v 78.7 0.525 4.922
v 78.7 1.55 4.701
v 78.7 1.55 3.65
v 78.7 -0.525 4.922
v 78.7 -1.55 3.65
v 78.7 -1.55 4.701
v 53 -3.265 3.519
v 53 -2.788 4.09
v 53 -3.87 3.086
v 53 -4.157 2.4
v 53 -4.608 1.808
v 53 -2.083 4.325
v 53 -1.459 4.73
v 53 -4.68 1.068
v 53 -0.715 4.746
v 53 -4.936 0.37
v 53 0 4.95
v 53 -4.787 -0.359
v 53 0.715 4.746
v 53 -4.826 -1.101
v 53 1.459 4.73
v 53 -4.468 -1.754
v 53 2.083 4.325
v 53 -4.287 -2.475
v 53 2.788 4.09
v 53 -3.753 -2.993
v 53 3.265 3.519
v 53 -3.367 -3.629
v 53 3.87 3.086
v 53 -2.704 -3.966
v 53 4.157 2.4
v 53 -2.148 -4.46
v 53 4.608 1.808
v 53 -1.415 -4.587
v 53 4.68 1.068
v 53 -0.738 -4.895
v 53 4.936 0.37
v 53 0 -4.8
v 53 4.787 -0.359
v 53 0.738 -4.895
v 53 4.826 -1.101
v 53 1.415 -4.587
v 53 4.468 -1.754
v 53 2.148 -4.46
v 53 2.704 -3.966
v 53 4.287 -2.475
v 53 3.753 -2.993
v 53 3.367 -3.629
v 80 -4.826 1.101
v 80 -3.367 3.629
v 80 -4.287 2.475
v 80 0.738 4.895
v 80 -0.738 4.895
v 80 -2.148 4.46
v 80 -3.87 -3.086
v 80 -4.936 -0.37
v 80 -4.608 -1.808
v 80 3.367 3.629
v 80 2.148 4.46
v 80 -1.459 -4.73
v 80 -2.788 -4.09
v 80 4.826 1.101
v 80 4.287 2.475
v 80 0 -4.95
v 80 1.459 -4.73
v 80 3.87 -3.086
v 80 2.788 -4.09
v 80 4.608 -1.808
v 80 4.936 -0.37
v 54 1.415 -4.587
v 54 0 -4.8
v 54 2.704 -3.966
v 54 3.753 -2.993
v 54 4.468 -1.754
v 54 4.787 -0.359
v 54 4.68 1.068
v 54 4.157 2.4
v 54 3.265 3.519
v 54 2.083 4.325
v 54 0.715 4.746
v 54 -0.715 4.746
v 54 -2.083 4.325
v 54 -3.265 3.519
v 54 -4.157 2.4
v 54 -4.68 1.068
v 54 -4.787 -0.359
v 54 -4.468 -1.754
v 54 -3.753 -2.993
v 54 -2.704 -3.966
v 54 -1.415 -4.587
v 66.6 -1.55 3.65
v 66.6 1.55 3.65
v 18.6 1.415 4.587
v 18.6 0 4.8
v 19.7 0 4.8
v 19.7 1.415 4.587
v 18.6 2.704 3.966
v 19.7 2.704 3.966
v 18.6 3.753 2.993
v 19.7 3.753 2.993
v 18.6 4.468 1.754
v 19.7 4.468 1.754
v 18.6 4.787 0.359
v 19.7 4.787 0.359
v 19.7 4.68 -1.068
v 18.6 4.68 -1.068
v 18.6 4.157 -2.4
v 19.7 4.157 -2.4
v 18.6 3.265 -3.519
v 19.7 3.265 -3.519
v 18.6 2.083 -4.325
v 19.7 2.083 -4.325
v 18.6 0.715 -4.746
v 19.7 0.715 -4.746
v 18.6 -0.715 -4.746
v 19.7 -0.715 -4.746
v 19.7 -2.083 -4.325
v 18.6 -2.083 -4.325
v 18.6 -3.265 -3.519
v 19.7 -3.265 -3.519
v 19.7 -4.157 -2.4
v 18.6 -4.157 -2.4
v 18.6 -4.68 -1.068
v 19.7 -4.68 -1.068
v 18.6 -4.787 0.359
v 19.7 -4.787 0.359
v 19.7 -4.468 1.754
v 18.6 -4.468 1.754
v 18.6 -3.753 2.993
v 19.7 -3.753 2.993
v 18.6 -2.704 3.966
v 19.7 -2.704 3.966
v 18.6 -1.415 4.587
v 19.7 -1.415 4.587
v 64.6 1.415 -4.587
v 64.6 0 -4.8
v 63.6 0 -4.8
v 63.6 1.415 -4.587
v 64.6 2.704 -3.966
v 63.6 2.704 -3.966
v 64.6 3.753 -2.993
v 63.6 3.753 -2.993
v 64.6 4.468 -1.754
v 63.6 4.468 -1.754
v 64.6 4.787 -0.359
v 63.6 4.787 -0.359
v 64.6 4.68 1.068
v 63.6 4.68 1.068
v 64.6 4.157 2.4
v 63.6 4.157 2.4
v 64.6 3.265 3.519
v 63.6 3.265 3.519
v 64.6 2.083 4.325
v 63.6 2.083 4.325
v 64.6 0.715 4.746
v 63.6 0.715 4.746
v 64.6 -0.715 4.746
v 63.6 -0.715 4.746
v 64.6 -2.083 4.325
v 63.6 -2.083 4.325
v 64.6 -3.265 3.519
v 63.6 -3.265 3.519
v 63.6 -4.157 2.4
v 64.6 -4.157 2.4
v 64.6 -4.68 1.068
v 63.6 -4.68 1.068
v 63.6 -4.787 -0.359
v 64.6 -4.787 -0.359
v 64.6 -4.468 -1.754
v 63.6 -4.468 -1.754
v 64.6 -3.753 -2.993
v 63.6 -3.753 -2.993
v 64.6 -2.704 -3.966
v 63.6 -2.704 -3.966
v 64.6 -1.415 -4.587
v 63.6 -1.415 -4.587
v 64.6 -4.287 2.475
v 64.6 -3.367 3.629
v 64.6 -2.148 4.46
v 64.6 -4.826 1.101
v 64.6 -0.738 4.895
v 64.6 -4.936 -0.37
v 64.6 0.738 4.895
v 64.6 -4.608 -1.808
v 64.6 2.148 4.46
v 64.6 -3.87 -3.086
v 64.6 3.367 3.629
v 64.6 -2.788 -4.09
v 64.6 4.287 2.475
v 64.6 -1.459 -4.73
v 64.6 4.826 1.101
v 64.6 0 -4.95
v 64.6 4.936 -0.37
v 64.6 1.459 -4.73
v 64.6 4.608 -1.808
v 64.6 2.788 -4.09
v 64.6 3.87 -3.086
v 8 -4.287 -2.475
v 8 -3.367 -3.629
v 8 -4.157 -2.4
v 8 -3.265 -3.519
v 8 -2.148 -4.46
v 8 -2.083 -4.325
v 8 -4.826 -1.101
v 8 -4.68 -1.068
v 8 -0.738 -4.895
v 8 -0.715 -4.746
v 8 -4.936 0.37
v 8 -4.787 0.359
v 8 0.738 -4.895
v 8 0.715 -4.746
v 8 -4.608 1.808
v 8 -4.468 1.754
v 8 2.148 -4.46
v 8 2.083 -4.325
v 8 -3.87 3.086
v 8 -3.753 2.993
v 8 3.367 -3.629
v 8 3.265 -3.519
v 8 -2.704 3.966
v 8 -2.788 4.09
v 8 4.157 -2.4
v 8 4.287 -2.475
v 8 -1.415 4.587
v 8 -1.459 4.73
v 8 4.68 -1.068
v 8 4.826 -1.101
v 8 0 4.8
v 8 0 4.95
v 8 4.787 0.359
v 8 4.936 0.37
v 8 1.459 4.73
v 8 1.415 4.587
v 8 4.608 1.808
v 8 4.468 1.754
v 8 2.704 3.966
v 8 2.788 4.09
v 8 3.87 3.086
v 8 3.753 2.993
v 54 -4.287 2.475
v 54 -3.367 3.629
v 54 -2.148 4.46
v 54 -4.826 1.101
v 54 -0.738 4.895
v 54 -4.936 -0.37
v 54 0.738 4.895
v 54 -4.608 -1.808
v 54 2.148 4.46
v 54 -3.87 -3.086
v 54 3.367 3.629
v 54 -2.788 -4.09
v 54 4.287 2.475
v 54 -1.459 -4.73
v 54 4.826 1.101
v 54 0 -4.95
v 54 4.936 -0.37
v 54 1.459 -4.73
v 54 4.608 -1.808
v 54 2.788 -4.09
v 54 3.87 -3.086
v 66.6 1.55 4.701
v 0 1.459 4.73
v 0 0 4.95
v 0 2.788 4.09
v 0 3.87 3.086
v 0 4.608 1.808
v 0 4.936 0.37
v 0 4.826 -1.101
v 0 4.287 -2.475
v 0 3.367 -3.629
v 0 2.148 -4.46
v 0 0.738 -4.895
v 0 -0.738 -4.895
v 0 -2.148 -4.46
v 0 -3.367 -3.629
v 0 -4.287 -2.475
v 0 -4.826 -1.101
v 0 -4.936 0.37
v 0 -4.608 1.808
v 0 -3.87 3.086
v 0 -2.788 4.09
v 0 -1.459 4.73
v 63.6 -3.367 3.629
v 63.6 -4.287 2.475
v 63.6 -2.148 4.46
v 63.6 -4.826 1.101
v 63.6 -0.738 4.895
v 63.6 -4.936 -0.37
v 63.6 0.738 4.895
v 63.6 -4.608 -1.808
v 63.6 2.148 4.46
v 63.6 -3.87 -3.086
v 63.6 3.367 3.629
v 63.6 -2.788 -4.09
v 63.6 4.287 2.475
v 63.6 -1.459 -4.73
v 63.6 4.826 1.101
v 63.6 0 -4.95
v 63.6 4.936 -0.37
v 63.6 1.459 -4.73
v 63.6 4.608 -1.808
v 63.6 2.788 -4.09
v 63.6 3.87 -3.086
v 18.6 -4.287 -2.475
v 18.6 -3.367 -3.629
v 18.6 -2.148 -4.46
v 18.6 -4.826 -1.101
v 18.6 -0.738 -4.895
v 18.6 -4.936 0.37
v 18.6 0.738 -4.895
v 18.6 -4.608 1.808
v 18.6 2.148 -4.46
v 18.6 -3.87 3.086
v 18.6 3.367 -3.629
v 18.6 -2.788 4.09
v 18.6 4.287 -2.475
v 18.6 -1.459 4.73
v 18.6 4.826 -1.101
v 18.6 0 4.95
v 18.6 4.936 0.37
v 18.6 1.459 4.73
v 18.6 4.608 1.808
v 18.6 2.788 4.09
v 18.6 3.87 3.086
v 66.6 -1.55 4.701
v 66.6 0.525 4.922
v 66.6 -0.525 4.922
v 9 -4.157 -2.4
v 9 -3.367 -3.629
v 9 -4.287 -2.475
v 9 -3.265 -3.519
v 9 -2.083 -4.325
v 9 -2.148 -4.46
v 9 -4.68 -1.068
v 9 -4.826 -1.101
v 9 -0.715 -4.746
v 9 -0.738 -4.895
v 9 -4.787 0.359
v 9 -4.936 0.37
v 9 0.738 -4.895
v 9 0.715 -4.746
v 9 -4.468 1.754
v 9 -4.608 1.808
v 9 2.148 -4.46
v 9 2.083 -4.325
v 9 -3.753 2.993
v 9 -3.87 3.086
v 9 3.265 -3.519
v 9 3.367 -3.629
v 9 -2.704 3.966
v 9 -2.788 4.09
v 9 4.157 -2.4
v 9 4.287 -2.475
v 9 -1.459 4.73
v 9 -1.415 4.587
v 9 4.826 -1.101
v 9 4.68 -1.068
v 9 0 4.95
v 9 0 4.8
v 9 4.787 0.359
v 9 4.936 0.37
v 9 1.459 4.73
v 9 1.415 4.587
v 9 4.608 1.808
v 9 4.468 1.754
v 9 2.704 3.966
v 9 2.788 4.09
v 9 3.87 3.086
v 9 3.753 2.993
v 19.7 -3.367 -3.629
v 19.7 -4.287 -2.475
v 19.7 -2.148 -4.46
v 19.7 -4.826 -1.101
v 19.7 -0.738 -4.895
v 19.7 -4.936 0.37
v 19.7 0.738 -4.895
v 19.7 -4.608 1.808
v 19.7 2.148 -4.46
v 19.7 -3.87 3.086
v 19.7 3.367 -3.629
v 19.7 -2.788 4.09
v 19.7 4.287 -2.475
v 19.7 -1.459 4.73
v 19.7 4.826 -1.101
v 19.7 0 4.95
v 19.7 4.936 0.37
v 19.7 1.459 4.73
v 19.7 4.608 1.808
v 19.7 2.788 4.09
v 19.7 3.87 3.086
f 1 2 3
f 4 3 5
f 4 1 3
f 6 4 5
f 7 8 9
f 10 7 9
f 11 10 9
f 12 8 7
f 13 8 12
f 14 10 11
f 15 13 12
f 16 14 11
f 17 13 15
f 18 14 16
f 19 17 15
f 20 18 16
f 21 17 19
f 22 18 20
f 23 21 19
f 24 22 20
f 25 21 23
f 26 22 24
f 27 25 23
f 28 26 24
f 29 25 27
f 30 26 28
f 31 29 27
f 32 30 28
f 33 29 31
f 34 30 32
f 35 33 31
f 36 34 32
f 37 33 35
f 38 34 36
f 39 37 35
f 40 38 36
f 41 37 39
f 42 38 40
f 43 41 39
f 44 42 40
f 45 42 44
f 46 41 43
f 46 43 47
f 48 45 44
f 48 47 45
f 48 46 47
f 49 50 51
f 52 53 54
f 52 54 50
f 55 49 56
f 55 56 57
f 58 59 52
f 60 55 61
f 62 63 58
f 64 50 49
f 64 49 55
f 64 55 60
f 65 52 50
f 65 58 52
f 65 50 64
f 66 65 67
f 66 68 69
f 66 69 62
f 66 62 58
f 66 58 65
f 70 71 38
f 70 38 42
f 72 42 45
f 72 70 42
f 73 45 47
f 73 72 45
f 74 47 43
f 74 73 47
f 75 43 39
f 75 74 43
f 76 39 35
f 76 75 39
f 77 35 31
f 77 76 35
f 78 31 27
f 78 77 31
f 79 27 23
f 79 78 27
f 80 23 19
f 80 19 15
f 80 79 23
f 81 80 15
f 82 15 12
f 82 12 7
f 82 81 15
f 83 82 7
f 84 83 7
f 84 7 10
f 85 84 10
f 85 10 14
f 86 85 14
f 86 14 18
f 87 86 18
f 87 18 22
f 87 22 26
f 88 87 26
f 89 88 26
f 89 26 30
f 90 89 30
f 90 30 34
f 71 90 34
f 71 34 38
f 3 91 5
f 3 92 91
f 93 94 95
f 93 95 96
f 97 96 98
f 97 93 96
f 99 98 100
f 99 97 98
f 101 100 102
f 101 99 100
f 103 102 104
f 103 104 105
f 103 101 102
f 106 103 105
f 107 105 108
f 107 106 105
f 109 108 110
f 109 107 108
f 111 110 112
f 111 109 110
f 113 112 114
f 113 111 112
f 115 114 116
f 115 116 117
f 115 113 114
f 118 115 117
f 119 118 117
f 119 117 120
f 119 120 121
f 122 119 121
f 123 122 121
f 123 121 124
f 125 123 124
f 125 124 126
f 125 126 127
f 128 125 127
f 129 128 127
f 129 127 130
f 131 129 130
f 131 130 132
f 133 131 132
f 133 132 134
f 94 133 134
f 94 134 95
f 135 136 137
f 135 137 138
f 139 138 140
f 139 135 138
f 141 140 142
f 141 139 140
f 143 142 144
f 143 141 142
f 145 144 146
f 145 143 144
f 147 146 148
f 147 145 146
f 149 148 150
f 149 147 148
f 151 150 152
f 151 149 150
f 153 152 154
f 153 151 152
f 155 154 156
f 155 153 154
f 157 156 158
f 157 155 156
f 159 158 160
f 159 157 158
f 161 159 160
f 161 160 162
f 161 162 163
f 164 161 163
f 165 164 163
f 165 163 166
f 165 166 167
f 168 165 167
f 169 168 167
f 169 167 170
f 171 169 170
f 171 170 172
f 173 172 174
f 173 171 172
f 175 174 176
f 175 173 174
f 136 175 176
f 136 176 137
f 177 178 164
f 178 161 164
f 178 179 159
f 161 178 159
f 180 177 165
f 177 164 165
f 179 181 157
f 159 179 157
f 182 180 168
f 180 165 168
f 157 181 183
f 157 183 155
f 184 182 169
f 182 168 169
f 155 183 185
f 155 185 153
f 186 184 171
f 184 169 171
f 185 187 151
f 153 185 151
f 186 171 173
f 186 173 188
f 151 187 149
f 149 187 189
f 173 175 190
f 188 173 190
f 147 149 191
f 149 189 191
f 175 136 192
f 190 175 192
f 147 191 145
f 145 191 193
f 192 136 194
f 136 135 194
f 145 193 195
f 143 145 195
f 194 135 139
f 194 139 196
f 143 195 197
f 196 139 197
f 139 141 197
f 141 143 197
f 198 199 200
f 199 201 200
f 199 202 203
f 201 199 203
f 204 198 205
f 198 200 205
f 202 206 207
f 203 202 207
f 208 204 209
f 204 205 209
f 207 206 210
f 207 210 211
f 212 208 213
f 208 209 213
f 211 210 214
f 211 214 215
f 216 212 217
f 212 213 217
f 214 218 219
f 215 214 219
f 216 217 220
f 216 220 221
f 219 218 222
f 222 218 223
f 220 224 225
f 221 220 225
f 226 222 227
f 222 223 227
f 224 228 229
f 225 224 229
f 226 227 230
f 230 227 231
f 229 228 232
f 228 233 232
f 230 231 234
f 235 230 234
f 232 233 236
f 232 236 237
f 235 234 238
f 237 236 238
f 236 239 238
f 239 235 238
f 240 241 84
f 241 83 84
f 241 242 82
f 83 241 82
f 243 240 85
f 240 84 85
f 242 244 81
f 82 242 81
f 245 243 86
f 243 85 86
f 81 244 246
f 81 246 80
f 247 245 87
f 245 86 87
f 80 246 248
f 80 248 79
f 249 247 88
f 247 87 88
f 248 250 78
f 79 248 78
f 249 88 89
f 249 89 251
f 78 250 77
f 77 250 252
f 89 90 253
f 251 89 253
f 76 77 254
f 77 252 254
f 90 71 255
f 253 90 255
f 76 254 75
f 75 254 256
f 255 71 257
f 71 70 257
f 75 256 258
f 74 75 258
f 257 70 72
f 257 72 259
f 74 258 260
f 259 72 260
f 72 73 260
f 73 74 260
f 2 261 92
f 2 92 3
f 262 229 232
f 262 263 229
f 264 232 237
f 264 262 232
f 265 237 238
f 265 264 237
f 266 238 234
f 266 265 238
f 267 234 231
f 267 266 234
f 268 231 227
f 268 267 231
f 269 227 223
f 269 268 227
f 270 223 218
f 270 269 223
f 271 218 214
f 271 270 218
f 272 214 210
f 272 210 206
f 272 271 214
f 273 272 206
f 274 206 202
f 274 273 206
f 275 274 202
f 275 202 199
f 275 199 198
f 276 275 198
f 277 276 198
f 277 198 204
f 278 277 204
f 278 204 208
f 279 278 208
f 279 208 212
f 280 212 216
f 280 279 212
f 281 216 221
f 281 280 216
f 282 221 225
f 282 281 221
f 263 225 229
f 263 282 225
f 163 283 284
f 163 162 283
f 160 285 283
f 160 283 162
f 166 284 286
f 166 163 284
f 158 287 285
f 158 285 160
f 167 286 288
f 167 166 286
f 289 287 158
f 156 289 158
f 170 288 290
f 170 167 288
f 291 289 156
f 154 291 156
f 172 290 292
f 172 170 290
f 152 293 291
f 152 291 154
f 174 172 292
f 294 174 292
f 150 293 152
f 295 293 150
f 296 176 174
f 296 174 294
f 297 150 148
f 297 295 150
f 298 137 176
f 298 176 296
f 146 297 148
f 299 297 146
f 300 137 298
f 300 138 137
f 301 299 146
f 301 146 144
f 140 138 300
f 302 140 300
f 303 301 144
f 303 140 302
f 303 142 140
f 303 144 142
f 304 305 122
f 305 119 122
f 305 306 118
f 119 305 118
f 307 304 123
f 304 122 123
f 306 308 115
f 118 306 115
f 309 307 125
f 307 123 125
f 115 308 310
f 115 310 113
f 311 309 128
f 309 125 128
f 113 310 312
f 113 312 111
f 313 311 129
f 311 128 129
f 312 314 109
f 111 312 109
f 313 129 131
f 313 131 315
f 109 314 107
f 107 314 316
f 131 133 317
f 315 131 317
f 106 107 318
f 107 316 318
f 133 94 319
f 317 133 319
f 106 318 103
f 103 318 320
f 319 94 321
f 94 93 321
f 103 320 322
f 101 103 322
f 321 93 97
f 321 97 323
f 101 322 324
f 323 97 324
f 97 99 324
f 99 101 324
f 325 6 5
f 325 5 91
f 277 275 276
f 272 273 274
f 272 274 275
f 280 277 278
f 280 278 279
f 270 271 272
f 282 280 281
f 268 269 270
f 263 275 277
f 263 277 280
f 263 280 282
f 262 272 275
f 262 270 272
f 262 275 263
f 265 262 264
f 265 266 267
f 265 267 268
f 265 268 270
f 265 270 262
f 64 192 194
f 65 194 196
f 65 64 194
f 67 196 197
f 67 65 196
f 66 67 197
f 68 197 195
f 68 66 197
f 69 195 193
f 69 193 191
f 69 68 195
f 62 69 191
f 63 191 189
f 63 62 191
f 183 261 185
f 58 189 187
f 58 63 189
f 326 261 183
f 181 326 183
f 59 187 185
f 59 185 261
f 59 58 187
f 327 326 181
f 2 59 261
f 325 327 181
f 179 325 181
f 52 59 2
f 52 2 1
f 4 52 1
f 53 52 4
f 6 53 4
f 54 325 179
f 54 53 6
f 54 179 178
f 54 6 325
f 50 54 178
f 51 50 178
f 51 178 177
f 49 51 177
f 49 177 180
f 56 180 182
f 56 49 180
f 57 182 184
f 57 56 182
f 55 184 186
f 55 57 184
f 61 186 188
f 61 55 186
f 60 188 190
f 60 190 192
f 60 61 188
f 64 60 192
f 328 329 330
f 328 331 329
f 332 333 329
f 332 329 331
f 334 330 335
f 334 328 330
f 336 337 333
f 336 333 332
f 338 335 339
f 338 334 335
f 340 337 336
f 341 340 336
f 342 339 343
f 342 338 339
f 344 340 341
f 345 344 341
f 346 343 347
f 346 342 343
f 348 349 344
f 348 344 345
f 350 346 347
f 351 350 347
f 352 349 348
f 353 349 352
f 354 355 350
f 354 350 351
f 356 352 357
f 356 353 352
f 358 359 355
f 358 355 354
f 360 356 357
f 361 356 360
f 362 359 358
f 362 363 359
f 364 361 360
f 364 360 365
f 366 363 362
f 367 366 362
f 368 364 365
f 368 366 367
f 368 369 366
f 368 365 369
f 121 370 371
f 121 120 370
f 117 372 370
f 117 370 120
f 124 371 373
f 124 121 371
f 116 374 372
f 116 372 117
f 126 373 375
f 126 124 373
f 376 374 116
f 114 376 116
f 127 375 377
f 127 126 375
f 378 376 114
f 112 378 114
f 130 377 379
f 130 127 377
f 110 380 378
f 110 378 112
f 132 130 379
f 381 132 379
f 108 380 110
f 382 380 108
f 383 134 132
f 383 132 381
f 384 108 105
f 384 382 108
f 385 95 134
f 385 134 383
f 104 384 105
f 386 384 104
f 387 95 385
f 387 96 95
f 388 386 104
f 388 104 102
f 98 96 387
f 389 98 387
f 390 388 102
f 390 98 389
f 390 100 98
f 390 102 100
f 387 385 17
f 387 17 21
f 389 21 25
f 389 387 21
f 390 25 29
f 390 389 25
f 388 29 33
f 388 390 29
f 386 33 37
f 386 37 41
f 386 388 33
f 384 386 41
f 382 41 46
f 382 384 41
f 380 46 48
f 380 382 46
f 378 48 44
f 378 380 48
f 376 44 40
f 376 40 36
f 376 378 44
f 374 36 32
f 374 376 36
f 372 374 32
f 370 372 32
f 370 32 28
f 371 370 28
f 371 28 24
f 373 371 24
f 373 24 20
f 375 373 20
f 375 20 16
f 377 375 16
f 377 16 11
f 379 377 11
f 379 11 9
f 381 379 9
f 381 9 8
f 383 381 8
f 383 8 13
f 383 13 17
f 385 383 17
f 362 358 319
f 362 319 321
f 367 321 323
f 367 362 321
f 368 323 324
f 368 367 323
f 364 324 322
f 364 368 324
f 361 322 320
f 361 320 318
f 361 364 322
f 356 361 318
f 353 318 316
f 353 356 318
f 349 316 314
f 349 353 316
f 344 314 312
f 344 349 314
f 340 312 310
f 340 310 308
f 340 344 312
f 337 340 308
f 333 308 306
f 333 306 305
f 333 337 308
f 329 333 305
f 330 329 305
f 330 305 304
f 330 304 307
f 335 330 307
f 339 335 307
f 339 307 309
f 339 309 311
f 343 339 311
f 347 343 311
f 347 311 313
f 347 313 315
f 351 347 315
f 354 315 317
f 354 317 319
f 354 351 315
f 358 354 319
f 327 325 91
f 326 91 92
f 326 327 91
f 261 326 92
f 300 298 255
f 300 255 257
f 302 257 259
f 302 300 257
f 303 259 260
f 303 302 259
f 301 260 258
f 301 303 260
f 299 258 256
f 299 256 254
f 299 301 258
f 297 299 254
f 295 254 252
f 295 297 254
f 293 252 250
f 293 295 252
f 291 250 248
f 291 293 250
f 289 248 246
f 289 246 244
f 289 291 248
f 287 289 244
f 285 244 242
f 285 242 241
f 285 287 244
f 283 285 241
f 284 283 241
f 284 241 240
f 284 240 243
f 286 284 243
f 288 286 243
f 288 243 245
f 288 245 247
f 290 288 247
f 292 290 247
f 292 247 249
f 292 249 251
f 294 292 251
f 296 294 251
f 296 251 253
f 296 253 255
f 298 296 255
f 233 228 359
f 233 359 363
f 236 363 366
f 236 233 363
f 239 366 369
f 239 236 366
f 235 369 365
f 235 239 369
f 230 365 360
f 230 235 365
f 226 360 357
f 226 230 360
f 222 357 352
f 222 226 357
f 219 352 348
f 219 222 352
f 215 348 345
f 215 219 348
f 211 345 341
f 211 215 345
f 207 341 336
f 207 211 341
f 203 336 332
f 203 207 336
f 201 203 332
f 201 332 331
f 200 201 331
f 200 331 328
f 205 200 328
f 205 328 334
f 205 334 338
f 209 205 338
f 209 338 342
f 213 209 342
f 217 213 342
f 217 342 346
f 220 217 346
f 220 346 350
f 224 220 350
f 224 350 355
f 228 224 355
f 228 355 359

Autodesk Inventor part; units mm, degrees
ref_plane "YZ Plane" through (0, 0, 0) normal (1, 0, 0) x (0, 1, 0)
ref_plane "XZ Plane" through (0, 0, 0) normal (0, 1, 0) x (-1, 0, 0)
sketch "스케치1" plane through (0, 0, 0) normal (1, 0, 0) x (0, 1, 0)
  circle A0 centre (0, 0) radius 6
  dimension "d0" = 12
extrude "돌출1" add sketch "스케치1" along normal blind 80
sketch "스케치8" plane through (0, 0, 0) normal (-1, 0, 0) x (0, 0, 1)
  circle A0 centre (0, 0) radius 6 projected
  circle A1 centre (0, 0) radius 4.95
  dimension "d26" = 9.9
extrude "돌출8" cut sketch "스케치8" against normal blind 18.6
sketch "스케치9" plane through (0, 0, 0) normal (-1, 0, 0) x (0, 0, 1)
  circle A0 centre (0, 0) radius 4.8
  circle A1 centre (0, 0) radius 4.95 projected
  dimension "d29" = 9.6
extrude "돌출9" cut sketch "스케치9" against normal blind 9
sketch "스케치10" plane through (0, 0, 0) normal (-1, 0, 0) x (0, 0, 1)
  circle A0 centre (0, 0) radius 4.95
  circle A1 centre (0, 0) radius 4.8 projected
  dimension "d32" = 9.9
extrude "돌출10" add sketch "스케치10" against normal blind 8
sketch "스케치11" plane through (80, 0, 0) normal (1, 0, 0) x (0, 0, -1)
  circle A0 centre (0, 0) radius 6 projected
  circle A1 centre (0, 0) radius 4.95
  dimension "d35" = 9.9
extrude "돌출11" cut sketch "스케치11" against normal blind 26
sketch "스케치12" plane through (80, 0, 0) normal (1, 0, 0) x (0, 0, -1)
  circle A0 centre (0, 0) radius 4.95 projected
  circle A1 centre (0, 0) radius 4.8
  dimension "d38" = 9.6
extrude "돌출12" cut sketch "스케치12" against normal blind 16.4
sketch "스케치13" plane through (80, 0, 0) normal (1, 0, 0) x (0, 0, -1)
  circle A0 centre (0, 0) radius 4.95
  circle A1 centre (0, 0) radius 4.8 projected
  dimension "d41" = 9.9
extrude "돌출13" add sketch "스케치13" against normal blind 15.4
ref_plane "작업 평면1" through (80, 0, 4.95) normal (0, 0, 1) x (1, 0, 0)
sketch "스케치14" plane through (80, 0, 4.95) normal (0, 0, 1) x (1, 0, 0)
  line L0 (-1.3, -1.55) -> (-13.4, -1.55)
  line L1 (-13.4, -1.55) -> (-13.4, 1.55)
  line L2 (-13.4, 1.55) -> (-1.3, 1.55)
  line L3 (-1.3, 1.55) -> (-1.3, -1.55)
  line L4 (-15.4, 4.95) -> (-15.4, -4.95) projected
  line L5 (0, 4.95) -> (0, -4.95) projected
  line L6 (0, 0) -> (-15.4, 0)
  line L7 (-15.4, 4.8) -> (-15.4, -4.8) projected
  point P0 (-80, 0)
  dimension "d44" = 12.1
  dimension "d45" = 3.1
  dimension "d46" = 12.1
  dimension "d47" = 2
  dimension "d48" = 1.55
extrude "돌출14" cut sketch "스케치14" against normal blind 1.3
sketch "스케치15" plane through (54, 0, 0) normal (1, 0, 0) x (0, 0, -1)
  circle A0 centre (0, 0) radius 4.95 projected
  circle A1 centre (0, 0) radius 6 projected
  circle A2 centre (0, 0) radius 4.95 projected
  circle A3 centre (0, 0) radius 4.95 projected
  circle A4 centre (0, 0) radius 4.8
  dimension "d51" = 9.6
extrude "돌출15" cut sketch "스케치15" against normal blind 1 contours A0 | A1
sketch "스케치16" plane through (18.6, 0, 0) normal (-1, 0, 0) x (0, 0, 1)
  circle A0 centre (0, 0) radius 4.95 projected
  circle A1 centre (0, 0) radius 6 projected
  circle A2 centre (0, 0) radius 4.95 projected
  circle A3 centre (0, 0) radius 4.8
  dimension "d54" = 9.6
extrude "돌출16" cut sketch "스케치16" against normal blind 1.1 contours A0 | A1
sketch "스케치17" plane through (19.7, 0, 0) normal (-1, 0, 0) x (0, 0, 1)
  circle A0 centre (0, 0) radius 4.8 projected
  circle A1 centre (0, 0) radius 6 projected
  circle A2 centre (0, 0) radius 4.95 projected
  circle A3 centre (0, 0) radius 4.95
extrude "돌출17" cut sketch "스케치17" against normal blind 33.35 contours A1
properties part number "10PI축" material "철, 주조"
